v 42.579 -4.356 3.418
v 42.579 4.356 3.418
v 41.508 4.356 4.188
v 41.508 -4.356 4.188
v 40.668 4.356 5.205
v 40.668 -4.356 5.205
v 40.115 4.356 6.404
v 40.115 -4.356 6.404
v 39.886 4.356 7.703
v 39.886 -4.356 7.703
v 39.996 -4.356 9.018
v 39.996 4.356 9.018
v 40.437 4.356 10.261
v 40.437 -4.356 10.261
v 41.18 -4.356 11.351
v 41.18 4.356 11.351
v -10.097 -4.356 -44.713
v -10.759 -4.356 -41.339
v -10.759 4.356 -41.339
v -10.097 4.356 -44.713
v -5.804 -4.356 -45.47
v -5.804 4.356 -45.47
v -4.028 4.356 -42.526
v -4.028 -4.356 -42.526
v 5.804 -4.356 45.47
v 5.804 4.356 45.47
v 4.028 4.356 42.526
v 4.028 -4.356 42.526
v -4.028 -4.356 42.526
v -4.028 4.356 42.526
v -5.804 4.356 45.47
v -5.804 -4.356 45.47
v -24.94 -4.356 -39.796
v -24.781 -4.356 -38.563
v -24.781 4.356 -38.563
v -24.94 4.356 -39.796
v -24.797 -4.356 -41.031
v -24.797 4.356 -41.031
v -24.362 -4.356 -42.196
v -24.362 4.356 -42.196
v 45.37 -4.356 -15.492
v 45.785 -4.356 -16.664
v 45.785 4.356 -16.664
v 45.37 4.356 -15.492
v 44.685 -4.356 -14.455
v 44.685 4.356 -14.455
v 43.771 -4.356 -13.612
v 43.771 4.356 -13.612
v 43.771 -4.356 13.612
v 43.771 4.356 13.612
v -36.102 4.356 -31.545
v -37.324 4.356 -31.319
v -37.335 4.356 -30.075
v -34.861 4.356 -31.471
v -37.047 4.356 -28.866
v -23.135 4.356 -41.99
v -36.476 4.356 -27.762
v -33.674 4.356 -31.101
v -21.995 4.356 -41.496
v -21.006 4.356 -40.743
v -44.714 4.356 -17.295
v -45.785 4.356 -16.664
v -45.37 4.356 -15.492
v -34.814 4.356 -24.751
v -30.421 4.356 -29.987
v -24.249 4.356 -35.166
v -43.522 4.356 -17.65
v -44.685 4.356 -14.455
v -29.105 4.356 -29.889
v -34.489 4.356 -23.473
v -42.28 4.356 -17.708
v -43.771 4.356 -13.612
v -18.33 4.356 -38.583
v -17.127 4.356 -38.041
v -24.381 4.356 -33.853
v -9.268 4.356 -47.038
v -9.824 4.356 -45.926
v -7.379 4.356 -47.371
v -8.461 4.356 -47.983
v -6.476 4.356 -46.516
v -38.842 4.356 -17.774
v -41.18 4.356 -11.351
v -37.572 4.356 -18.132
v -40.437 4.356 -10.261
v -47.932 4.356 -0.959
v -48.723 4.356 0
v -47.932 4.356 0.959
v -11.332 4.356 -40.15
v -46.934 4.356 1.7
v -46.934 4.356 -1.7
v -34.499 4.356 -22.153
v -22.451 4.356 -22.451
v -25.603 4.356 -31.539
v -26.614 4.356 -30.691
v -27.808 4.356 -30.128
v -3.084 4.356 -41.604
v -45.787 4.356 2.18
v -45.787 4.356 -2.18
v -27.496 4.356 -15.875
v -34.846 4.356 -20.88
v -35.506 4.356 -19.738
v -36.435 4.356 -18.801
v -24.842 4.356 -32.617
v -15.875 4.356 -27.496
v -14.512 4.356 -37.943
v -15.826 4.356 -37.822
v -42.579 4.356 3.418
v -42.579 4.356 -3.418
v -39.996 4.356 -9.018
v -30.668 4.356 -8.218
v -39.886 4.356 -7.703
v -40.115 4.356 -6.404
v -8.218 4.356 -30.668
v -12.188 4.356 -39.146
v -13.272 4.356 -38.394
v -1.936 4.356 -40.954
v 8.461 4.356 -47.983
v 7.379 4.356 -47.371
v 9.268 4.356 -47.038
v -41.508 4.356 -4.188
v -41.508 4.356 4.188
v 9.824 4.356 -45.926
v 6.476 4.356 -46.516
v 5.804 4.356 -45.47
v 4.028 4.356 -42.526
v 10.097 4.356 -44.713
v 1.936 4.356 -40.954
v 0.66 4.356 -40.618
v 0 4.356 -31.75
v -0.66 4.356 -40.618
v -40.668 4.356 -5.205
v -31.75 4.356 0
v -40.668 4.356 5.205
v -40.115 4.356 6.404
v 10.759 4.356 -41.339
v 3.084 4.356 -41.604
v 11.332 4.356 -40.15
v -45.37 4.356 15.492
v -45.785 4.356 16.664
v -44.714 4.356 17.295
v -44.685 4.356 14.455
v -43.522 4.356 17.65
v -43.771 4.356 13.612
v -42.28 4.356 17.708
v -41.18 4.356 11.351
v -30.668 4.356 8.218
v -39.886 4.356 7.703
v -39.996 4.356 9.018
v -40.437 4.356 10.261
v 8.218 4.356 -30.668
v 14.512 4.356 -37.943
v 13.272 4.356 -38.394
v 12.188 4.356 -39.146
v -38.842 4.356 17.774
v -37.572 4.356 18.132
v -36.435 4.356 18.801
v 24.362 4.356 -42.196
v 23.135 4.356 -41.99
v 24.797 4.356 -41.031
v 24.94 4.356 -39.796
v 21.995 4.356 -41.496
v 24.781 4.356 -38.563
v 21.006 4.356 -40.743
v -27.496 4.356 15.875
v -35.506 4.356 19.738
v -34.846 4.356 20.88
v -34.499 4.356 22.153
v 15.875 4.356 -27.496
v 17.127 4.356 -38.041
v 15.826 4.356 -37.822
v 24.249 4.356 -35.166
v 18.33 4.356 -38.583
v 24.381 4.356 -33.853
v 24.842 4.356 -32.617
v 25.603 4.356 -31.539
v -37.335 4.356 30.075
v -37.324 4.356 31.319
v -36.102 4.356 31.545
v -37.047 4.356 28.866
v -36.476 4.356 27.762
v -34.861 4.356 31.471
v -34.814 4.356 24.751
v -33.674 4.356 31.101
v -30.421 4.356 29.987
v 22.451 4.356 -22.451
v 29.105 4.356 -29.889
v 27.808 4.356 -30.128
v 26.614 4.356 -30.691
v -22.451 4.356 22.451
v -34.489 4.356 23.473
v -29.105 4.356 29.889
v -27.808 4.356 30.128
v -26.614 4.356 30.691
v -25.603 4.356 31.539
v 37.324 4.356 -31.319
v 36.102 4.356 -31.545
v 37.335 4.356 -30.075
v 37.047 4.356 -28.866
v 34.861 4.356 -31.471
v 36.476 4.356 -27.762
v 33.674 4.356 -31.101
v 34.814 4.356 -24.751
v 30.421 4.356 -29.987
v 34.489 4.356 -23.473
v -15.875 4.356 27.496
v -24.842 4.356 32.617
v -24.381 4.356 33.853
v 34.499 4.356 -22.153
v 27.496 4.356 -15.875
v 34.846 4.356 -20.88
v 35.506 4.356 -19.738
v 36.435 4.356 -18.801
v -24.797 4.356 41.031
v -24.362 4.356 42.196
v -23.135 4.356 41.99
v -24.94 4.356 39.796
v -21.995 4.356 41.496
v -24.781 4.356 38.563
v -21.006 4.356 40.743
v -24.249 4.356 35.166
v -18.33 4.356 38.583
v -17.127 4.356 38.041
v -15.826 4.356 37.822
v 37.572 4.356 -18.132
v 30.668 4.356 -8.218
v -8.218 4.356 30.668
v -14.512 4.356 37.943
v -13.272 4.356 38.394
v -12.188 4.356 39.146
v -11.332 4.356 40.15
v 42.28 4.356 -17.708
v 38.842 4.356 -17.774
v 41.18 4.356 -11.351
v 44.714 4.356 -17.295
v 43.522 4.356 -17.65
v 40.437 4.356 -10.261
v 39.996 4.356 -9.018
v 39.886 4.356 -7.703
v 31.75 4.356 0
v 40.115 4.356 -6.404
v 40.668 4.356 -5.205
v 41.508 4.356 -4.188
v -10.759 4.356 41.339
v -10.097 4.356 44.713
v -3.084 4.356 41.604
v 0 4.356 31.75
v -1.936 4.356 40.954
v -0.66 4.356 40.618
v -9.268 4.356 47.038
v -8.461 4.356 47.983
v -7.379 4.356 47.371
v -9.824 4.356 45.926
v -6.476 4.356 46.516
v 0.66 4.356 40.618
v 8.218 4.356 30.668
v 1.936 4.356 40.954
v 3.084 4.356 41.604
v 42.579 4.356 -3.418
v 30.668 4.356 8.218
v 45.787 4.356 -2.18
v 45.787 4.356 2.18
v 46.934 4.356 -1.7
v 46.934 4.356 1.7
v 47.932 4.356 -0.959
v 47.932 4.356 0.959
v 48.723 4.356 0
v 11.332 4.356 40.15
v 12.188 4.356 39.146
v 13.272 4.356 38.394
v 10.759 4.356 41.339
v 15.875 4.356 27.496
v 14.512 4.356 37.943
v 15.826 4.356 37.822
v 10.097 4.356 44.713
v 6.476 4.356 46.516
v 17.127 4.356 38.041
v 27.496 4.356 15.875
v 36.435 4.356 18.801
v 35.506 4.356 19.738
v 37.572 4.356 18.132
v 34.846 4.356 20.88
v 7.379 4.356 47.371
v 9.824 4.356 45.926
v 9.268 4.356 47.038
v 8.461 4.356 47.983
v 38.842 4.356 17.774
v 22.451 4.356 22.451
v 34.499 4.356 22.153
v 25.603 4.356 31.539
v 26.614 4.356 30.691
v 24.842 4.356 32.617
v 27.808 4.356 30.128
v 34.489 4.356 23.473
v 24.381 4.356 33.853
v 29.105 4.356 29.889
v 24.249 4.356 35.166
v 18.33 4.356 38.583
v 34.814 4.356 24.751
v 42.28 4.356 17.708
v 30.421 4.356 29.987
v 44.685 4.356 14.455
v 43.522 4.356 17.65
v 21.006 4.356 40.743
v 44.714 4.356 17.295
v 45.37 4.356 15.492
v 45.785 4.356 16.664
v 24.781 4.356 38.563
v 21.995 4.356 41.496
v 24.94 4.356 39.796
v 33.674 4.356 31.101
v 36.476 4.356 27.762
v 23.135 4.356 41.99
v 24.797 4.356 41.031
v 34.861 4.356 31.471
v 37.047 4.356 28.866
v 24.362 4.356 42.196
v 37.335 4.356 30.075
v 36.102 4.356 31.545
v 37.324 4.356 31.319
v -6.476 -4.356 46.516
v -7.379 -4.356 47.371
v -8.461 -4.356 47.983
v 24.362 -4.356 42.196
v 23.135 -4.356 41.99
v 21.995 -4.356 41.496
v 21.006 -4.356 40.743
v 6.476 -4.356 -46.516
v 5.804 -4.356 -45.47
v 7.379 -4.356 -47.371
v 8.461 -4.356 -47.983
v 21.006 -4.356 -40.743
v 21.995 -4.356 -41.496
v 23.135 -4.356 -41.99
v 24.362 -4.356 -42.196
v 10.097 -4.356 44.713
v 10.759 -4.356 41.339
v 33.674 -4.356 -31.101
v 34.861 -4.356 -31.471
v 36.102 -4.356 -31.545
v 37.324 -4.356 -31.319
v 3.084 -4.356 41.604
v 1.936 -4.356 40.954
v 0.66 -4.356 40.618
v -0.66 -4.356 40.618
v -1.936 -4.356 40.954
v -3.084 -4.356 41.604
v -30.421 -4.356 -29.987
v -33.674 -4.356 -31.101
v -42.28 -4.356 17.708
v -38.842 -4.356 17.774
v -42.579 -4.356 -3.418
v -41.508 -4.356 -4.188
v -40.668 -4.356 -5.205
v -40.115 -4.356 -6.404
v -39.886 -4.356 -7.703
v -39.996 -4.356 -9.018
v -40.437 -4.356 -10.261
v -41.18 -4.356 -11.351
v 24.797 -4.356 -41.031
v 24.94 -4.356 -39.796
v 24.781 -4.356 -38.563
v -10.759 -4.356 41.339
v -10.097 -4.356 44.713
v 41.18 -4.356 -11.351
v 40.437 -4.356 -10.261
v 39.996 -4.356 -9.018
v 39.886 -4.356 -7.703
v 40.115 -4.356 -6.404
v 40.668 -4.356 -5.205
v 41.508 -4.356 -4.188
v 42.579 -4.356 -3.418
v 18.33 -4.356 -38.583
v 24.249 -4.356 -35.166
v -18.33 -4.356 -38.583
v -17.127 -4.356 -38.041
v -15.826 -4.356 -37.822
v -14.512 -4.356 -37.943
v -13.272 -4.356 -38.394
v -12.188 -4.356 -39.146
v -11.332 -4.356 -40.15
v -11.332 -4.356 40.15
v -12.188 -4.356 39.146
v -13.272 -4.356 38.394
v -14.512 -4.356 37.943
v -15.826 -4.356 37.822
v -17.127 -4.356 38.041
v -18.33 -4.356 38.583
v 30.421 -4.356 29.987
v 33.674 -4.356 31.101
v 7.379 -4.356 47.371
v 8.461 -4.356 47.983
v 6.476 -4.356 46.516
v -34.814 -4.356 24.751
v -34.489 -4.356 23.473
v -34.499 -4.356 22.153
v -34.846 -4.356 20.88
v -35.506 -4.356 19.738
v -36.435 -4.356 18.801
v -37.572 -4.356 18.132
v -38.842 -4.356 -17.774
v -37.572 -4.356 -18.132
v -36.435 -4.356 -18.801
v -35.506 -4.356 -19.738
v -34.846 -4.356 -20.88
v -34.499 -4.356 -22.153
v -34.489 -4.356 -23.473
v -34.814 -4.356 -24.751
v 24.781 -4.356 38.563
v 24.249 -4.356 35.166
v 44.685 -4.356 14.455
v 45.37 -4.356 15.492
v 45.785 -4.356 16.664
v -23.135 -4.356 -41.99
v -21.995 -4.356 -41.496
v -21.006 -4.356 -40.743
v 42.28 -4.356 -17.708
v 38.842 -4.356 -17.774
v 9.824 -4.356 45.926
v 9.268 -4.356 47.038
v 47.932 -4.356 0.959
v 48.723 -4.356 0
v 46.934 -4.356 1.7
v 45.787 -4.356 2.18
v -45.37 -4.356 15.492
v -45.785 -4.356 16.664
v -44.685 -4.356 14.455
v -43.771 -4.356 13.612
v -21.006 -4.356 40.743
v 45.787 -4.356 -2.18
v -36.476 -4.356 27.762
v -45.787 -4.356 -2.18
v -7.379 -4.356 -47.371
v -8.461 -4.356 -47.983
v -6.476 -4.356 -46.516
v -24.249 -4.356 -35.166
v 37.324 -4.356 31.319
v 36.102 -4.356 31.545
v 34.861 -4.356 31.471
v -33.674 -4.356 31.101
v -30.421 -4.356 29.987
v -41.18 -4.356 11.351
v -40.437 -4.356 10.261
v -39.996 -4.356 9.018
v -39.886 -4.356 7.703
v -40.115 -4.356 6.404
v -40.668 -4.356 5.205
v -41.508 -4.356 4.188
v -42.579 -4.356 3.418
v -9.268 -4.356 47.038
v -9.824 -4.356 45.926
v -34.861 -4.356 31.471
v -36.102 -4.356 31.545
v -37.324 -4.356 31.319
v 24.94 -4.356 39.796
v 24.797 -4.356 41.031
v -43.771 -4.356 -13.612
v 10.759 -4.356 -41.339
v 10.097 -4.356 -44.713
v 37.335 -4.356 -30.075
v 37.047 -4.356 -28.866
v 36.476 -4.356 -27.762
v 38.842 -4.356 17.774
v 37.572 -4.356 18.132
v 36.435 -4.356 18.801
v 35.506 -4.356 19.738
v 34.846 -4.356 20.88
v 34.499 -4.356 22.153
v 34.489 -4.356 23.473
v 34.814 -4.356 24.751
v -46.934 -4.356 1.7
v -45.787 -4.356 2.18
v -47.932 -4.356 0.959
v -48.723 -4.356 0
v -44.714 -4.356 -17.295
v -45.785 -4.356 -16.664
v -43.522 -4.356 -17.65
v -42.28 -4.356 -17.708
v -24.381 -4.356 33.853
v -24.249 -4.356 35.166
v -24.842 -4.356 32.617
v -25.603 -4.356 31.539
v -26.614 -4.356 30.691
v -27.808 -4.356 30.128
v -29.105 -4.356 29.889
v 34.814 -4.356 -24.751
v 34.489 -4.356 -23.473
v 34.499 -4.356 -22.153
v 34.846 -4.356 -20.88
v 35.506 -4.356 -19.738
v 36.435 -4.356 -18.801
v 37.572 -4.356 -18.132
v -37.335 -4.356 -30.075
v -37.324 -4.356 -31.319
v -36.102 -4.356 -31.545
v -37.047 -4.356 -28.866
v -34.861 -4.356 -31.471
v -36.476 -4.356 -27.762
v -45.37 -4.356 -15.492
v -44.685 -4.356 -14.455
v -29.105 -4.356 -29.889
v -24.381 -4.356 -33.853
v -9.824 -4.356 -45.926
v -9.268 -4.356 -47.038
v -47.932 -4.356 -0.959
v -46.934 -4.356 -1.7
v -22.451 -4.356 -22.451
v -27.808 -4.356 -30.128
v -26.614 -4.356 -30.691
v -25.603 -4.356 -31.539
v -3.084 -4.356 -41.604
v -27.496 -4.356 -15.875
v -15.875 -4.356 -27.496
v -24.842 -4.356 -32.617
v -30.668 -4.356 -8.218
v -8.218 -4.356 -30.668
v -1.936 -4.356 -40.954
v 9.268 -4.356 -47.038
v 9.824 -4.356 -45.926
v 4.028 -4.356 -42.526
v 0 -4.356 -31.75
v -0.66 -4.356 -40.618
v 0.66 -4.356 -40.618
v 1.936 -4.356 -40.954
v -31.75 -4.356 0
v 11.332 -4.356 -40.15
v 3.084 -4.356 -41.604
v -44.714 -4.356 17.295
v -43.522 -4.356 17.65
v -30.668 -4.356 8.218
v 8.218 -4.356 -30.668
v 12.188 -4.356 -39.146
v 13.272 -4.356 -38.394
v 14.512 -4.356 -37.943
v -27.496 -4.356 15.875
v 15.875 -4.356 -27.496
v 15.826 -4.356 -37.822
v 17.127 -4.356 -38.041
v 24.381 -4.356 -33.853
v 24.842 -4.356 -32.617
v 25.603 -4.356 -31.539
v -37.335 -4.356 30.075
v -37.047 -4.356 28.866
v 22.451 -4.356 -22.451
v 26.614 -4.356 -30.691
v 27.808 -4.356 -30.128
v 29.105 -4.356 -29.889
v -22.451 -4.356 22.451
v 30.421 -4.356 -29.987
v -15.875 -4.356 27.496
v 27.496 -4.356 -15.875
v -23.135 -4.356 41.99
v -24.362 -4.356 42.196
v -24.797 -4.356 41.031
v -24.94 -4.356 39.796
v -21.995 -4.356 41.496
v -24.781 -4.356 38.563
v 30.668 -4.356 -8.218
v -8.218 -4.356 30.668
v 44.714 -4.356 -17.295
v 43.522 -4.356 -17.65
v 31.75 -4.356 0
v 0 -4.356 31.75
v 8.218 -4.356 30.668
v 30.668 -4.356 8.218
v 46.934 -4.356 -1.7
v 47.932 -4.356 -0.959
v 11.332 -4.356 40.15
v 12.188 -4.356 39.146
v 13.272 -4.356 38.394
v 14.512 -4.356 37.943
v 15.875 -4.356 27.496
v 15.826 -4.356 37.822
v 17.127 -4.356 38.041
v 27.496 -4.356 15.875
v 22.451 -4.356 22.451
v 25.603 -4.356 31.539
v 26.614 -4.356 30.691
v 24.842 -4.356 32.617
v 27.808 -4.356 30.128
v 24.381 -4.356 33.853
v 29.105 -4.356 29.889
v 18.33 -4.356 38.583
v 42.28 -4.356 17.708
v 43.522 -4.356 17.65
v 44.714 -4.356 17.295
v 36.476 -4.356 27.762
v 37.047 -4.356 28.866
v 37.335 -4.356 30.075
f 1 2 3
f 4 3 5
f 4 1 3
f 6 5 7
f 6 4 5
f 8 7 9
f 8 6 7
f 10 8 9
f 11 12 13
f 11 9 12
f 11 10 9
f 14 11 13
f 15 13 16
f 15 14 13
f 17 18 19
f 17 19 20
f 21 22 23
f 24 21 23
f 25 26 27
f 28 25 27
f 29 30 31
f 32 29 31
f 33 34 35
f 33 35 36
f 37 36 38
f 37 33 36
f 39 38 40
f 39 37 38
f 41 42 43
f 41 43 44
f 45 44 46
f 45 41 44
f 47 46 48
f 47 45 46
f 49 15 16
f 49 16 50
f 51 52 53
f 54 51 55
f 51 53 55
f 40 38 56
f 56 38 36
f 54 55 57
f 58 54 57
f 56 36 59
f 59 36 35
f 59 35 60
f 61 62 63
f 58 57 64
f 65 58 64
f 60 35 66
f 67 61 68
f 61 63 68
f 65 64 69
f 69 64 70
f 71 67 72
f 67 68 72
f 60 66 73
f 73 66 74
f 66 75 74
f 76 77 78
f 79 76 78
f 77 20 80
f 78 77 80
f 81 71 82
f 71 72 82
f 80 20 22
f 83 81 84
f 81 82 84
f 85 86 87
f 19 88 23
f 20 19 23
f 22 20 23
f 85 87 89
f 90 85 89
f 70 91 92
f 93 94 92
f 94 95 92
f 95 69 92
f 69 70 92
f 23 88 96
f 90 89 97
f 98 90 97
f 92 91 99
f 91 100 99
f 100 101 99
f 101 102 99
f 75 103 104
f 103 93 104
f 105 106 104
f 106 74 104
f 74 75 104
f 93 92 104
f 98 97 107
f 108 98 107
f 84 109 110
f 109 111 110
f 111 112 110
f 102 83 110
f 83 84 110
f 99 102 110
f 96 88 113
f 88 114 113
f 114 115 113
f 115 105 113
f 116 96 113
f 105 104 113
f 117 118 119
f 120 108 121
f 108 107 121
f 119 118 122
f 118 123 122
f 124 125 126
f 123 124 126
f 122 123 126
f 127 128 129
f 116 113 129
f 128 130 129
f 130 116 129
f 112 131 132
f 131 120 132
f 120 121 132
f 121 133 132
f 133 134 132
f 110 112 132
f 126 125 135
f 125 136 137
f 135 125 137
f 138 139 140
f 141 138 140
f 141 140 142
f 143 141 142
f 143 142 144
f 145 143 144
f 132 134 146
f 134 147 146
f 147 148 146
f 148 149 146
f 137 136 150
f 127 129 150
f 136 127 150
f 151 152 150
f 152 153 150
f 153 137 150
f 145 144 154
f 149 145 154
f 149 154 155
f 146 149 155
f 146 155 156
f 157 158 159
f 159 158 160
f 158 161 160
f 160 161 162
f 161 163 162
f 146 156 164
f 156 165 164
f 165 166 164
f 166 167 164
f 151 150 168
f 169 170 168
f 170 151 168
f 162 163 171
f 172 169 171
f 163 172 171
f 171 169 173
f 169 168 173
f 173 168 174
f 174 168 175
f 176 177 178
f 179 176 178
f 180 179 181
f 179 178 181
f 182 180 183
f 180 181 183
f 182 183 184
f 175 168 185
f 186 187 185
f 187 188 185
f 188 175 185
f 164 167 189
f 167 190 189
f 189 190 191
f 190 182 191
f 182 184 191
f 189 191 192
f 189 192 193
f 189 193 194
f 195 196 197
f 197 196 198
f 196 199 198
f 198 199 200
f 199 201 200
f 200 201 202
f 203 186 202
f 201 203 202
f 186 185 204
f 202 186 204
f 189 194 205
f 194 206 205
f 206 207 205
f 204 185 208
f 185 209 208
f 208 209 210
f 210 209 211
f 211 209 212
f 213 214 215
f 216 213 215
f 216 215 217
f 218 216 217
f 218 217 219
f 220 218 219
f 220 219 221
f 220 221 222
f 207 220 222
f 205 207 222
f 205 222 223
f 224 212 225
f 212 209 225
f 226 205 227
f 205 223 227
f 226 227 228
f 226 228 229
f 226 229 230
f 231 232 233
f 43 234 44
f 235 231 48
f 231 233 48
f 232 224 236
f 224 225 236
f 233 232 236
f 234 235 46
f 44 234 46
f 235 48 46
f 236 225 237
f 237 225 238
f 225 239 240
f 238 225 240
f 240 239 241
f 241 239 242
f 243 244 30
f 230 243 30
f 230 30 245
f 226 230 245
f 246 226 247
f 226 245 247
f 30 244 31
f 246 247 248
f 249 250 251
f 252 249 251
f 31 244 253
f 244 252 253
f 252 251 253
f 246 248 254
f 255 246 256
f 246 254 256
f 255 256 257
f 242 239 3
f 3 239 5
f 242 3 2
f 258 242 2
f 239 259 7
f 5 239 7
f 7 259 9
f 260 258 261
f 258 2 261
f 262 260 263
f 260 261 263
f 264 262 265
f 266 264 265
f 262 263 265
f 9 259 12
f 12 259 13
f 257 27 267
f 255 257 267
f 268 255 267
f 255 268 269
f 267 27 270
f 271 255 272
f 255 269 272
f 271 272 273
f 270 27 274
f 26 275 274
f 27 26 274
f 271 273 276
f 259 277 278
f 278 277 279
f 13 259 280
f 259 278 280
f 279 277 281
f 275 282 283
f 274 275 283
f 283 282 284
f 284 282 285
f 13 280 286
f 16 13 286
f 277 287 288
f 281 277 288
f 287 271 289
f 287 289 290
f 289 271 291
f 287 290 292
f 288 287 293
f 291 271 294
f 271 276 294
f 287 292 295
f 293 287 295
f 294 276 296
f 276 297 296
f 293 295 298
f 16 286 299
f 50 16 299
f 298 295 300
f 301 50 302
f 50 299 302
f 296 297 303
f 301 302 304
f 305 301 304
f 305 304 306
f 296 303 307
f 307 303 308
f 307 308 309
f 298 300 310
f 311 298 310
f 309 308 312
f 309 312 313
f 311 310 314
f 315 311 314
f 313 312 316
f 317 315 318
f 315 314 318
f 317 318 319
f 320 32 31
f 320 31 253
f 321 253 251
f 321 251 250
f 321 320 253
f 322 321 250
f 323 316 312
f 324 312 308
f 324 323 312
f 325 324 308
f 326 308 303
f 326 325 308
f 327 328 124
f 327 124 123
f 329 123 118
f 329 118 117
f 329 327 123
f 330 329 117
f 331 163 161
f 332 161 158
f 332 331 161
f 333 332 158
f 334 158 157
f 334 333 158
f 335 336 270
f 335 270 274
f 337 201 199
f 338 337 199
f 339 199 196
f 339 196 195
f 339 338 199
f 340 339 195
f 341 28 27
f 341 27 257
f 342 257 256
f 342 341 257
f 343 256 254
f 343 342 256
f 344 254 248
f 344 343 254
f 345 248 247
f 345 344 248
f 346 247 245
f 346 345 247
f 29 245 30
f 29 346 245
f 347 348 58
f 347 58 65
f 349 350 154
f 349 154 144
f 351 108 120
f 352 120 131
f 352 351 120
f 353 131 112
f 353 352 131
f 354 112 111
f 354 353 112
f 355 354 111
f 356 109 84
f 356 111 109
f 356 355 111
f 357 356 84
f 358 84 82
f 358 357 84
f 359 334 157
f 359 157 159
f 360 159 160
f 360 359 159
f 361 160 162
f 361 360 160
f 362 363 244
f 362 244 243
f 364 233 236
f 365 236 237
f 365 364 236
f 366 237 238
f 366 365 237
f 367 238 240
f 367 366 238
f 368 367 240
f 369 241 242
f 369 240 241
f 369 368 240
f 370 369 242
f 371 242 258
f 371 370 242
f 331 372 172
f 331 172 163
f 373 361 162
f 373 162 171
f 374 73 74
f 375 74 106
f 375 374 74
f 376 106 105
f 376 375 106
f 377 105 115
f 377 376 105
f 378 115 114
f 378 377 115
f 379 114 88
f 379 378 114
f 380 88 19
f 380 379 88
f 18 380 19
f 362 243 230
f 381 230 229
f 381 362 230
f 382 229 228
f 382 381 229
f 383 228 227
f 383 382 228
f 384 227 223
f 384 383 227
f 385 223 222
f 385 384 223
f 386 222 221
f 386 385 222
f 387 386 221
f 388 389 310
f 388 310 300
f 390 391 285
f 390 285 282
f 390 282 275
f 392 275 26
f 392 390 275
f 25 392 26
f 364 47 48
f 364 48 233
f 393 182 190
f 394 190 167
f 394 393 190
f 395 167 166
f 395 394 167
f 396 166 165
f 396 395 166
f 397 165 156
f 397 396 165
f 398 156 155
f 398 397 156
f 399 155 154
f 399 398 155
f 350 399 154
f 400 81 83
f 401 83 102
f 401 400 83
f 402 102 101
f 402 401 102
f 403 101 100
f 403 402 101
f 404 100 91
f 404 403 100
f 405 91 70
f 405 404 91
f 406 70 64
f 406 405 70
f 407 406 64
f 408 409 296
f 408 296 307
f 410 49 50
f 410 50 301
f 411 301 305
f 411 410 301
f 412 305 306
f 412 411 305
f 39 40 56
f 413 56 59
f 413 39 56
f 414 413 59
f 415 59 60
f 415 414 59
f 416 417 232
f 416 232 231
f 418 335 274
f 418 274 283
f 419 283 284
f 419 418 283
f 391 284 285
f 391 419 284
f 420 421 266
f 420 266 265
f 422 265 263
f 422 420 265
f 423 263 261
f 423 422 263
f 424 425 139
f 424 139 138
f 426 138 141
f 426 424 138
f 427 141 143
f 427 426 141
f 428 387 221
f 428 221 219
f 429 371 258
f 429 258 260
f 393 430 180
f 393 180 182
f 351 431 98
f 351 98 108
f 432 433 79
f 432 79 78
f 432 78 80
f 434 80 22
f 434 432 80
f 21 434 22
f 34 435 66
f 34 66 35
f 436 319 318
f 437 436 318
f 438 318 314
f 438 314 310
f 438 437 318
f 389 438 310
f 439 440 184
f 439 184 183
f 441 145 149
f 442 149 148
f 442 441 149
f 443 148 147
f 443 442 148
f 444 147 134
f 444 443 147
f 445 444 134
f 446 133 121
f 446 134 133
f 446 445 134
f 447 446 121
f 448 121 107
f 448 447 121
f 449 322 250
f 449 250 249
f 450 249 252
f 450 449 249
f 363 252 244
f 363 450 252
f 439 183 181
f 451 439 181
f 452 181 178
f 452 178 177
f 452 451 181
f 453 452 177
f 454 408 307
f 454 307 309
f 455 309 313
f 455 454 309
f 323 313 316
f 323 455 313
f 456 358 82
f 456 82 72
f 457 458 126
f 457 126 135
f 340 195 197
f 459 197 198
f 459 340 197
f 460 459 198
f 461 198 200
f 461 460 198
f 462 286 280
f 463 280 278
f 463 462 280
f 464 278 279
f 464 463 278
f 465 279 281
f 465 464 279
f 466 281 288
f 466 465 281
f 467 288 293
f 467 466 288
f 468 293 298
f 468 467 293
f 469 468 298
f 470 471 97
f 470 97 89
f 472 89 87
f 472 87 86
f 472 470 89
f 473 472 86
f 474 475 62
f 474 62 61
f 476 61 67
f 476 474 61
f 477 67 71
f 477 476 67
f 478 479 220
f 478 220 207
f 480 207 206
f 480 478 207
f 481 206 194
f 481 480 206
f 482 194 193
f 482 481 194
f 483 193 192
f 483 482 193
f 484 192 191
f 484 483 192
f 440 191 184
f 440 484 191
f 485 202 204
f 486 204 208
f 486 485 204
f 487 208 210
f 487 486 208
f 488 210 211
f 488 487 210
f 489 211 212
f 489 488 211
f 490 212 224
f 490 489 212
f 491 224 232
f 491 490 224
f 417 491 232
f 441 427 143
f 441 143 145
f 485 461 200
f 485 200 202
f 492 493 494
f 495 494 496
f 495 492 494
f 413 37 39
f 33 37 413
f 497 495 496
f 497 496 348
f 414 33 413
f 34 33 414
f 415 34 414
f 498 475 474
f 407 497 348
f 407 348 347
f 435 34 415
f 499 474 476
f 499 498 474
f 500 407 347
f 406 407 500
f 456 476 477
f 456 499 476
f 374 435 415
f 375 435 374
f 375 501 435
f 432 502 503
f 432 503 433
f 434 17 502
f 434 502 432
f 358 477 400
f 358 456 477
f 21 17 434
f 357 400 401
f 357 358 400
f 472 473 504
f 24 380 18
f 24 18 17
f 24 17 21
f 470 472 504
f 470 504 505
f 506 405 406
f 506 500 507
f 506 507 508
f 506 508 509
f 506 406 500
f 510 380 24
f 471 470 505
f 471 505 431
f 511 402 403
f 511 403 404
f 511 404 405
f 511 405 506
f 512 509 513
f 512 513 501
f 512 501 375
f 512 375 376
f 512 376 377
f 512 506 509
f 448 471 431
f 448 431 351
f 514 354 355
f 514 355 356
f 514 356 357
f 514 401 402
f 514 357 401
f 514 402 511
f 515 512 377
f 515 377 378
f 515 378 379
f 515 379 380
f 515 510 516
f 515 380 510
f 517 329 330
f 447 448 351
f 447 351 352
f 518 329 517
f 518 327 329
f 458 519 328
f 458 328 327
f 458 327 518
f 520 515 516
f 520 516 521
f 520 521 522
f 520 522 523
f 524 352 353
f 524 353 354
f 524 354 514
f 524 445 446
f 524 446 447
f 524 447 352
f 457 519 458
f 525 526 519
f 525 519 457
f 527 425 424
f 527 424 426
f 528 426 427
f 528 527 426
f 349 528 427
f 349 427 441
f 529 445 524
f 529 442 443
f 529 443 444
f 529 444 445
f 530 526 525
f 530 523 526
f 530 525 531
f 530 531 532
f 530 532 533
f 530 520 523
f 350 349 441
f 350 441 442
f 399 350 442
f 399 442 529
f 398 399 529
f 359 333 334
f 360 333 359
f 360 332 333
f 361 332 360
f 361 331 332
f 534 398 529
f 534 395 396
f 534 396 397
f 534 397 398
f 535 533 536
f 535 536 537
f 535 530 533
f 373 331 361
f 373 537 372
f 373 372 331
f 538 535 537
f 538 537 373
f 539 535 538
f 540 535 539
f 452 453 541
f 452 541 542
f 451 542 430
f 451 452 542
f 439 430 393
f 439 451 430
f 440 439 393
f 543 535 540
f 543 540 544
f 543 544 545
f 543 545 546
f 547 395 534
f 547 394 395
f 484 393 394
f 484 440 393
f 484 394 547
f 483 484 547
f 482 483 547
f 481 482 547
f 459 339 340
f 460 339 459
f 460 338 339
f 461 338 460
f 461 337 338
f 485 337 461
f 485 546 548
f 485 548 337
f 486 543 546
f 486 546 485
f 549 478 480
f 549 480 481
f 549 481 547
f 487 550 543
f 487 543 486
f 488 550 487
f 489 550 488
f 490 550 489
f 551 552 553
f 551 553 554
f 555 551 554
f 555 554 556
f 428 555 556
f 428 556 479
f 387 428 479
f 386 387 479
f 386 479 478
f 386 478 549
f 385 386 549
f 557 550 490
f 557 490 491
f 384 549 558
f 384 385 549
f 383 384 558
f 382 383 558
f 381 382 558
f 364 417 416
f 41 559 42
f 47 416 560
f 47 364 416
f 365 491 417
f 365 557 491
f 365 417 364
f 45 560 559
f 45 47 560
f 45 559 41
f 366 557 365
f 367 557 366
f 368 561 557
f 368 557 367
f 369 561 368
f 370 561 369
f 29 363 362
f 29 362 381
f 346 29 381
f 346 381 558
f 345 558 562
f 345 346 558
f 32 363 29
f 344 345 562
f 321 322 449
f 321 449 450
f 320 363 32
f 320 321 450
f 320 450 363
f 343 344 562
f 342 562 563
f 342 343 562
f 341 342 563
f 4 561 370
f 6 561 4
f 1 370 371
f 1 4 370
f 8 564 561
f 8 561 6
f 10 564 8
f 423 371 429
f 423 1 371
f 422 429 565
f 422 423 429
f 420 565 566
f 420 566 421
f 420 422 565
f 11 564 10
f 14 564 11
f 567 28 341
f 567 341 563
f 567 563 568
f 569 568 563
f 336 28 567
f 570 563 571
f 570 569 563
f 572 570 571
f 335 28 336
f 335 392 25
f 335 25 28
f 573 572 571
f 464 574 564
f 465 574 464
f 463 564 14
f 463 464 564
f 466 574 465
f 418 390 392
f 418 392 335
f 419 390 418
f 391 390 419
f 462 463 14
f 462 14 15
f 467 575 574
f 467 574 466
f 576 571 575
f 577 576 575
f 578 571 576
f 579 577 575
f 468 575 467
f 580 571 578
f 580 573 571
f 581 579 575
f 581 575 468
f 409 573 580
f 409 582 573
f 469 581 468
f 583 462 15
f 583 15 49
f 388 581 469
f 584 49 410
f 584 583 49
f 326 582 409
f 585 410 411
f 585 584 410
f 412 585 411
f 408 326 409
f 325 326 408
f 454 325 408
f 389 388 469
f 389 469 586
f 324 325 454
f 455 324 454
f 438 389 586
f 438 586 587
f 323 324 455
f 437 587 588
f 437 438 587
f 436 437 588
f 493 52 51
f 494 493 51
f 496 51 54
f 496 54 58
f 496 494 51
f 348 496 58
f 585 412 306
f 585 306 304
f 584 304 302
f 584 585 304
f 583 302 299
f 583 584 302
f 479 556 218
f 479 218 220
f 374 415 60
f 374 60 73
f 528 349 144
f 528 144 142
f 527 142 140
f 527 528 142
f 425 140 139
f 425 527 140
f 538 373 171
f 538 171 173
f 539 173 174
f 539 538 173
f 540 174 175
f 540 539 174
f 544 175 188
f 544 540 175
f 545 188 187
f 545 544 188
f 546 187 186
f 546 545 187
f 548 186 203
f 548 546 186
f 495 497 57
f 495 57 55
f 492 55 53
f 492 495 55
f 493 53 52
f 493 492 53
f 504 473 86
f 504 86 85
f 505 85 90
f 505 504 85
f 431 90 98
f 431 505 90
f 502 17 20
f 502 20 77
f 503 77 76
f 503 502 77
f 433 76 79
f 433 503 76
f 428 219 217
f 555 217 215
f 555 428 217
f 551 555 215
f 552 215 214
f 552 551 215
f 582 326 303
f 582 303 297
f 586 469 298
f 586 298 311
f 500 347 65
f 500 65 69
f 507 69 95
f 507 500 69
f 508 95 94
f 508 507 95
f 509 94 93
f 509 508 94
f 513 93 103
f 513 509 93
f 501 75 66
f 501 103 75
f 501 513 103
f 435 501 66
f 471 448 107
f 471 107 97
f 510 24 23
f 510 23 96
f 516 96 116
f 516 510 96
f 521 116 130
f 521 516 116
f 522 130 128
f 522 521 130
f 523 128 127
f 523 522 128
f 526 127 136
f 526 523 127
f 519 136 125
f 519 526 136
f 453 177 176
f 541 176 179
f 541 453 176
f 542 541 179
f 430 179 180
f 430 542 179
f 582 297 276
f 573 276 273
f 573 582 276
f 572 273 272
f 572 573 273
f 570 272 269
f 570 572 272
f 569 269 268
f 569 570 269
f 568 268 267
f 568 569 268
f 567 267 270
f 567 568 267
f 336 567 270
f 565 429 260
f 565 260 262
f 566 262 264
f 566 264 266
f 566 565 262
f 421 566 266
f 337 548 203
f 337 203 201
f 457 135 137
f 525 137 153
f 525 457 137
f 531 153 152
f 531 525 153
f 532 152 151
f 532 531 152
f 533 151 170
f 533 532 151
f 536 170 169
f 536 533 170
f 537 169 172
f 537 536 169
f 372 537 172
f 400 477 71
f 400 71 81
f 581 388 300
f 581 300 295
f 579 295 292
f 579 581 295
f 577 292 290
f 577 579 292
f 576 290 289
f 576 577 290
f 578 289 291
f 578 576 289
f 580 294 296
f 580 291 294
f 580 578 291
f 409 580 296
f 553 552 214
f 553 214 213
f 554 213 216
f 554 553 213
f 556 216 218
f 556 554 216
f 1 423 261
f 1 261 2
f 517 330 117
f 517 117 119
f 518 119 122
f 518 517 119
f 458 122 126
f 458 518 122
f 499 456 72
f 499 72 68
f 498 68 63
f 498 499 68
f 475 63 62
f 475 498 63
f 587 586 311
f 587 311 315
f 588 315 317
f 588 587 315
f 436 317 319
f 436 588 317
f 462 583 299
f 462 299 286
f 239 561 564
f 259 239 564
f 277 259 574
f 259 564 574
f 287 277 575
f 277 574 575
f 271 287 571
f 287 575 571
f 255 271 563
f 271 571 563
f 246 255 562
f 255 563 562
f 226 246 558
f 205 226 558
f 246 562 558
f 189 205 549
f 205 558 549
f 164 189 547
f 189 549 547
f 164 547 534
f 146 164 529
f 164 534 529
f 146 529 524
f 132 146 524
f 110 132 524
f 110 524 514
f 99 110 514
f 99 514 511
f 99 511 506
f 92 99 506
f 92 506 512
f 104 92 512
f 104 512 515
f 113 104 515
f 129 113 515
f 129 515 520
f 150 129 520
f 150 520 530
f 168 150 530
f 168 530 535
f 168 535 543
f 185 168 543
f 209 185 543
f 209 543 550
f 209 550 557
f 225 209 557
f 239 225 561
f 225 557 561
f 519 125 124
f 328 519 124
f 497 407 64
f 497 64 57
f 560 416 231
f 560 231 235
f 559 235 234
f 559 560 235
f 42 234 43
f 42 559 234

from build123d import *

# Parameters (mm, degrees)
F0_R     = 49.784
F1_DEPTH = 4.3561
F2_R     = 31.75
F3_DEPTH = 8.7132
F4_R     = 31.75
F5_DEPTH = 8.7132


with BuildPart() as f1:
    # F0 (on Front) → F1 (new body, symmetric)
    with BuildSketch(Plane.XZ):
        Circle(F0_R)
    extrude(amount=F1_DEPTH, both=True)

    # F2 (on face) → F3 (cut, through all)
    with BuildSketch(Plane.XZ.offset(4.3561)):
        Circle(F2_R)
    extrude(amount=-F3_DEPTH, mode=Mode.SUBTRACT)

    # F4 (on face) → F5 (intersect, through all)
    with BuildSketch(Plane.XZ.offset(4.3561)):
        with BuildLine():
            Line((-4.0281049428, 42.525724672), (-5.8042455242, 45.4699524537))
            ThreePointArc((-5.8042455242, 45.4699524537), (-6.9011720072, 46.9709680265), (-8.4606952501, 47.9829871535))
            ThreePointArc((-8.4606952501, 47.9829871535), (-9.5800368067, 46.4986118846), (-10.0974329669, 44.7129476743))
            Line((-10.0974329669, 44.7129476743), (-10.7594739569, 41.3388026977))
            ThreePointArc((-10.7594739569, 41.3388026977), (-13.8775459801, 38.1282442177), (-18.3298349378, 38.583416638))
            Line((-18.3298349378, 38.583416638), (-21.0058463435, 40.7426099021))
            ThreePointArc((-21.0058463435, 40.7426099021), (-22.5499976265, 41.7779322066), (-24.3616010367, 42.1955307493))
            ThreePointArc((-24.3616010367, 42.1955307493), (-24.9057517953, 40.4178369031), (-24.78121202, 38.5629015125))
            Line((-24.78121202, 38.5629015125), (-24.2493015044, 35.1658110223))
            ThreePointArc((-24.2493015044, 35.1658110223), (-26.0812551042, 31.0824294698), (-30.4207163198, 29.9873791269))
            Line((-30.4207163198, 29.9873791269), (-33.6738320805, 31.1011072995))
            ThreePointArc((-33.6738320805, 31.1011072995), (-35.4789607295, 31.5458611861), (-37.3241381993, 31.318670597))
            ThreePointArc((-37.3241381993, 31.318670597), (-37.2274655477, 29.4620742873), (-36.4760111717, 27.7616003006))
            Line((-36.4760111717, 27.7616003006), (-34.8143054089, 24.7513035456))
            ThreePointArc((-34.8143054089, 24.7513035456), (-35.1391799444, 20.287615), (-38.8424103517, 17.7744211264))
            Line((-38.8424103517, 17.7744211264), (-42.2802566958, 17.7083521531))
            ThreePointArc((-42.2802566958, 17.7083521531), (-44.1286375548, 17.5088937391), (-45.7848334494, 16.6643165564))
            ThreePointArc((-45.7848334494, 16.6643165564), (-45.0589975361, 14.9527506986), (-43.7712650475, 13.6118403748))
            Line((-43.7712650475, 13.6118403748), (-41.1801902767, 11.3514235709))
            ThreePointArc((-41.1801902767, 11.3514235709), (-39.9588010843, 7.0458147479), (-42.5791364422, 3.4176056157))
            Line((-42.5791364422, 3.4176056157), (-45.7870583635, 2.1797083896))
            ThreePointArc((-45.7870583635, 2.1797083896), (-47.4557494218, 1.3600953035), (-48.7232020734, 0))
            ThreePointArc((-48.7232020734, 0), (-47.4557494218, -1.3600953035), (-45.7870583635, -2.1797083896))
            Line((-45.7870583635, -2.1797083896), (-42.5791364422, -3.4176056157))
            ThreePointArc((-42.5791364422, -3.4176056157), (-39.9588010843, -7.0458147479), (-41.1801902767, -11.3514235709))
            Line((-41.1801902767, -11.3514235709), (-43.7712650475, -13.6118403748))
            ThreePointArc((-43.7712650475, -13.6118403748), (-45.0589975361, -14.9527506986), (-45.7848334494, -16.6643165564))
            ThreePointArc((-45.7848334494, -16.6643165564), (-44.1286375548, -17.5088937391), (-42.2802566958, -17.7083521531))
            Line((-42.2802566958, -17.7083521531), (-38.8424103517, -17.7744211264))
            ThreePointArc((-38.8424103517, -17.7744211264), (-35.1391799444, -20.287615), (-34.8143054089, -24.7513035456))
            Line((-34.8143054089, -24.7513035456), (-36.4760111717, -27.7616003006))
            ThreePointArc((-36.4760111717, -27.7616003006), (-37.2274655477, -29.4620742873), (-37.3241381993, -31.318670597))
            ThreePointArc((-37.3241381993, -31.318670597), (-35.4789607295, -31.5458611861), (-33.6738320805, -31.1011072995))
            Line((-33.6738320805, -31.1011072995), (-30.4207163198, -29.9873791269))
            ThreePointArc((-30.4207163198, -29.9873791269), (-26.0812551042, -31.0824294698), (-24.2493015044, -35.1658110223))
            Line((-24.2493015044, -35.1658110223), (-24.78121202, -38.5629015125))
            ThreePointArc((-24.78121202, -38.5629015125), (-24.9057517953, -40.4178369031), (-24.3616010367, -42.1955307493))
            ThreePointArc((-24.3616010367, -42.1955307493), (-22.5499976265, -41.7779322066), (-21.0058463435, -40.7426099021))
            Line((-21.0058463435, -40.7426099021), (-18.3298349378, -38.583416638))
            ThreePointArc((-18.3298349378, -38.583416638), (-13.8775459801, -38.1282442177), (-10.7594739569, -41.3388026977))
            Line((-10.7594739569, -41.3388026977), (-10.0974329669, -44.7129476743))
            ThreePointArc((-10.0974329669, -44.7129476743), (-9.5800368067, -46.4986118846), (-8.4606952501, -47.9829871535))
            ThreePointArc((-8.4606952501, -47.9829871535), (-6.9011720072, -46.9709680265), (-5.8042455242, -45.4699524537))
            Line((-5.8042455242, -45.4699524537), (-4.0281049428, -42.525724672))
            ThreePointArc((-4.0281049428, -42.525724672), (0, -40.57523), (4.0281049428, -42.525724672))
            Line((4.0281049428, -42.525724672), (5.8042455242, -45.4699524537))
            ThreePointArc((5.8042455242, -45.4699524537), (6.9011720072, -46.9709680265), (8.4606952501, -47.9829871535))
            ThreePointArc((8.4606952501, -47.9829871535), (9.5800368067, -46.4986118846), (10.0974329669, -44.7129476743))
            Line((10.0974329669, -44.7129476743), (10.7594739569, -41.3388026977))
            ThreePointArc((10.7594739569, -41.3388026977), (13.8775459801, -38.1282442177), (18.3298349378, -38.583416638))
            Line((18.3298349378, -38.583416638), (21.0058463435, -40.7426099021))
            ThreePointArc((21.0058463435, -40.7426099021), (22.5499976265, -41.7779322066), (24.3616010367, -42.1955307493))
            ThreePointArc((24.3616010367, -42.1955307493), (24.9057517953, -40.4178369031), (24.78121202, -38.5629015125))
            Line((24.78121202, -38.5629015125), (24.2493015044, -35.1658110223))
            ThreePointArc((24.2493015044, -35.1658110223), (26.0812551042, -31.0824294698), (30.4207163198, -29.9873791269))
            Line((30.4207163198, -29.9873791269), (33.6738320805, -31.1011072995))
            ThreePointArc((33.6738320805, -31.1011072995), (35.4789607295, -31.5458611861), (37.3241381993, -31.318670597))
            ThreePointArc((37.3241381993, -31.318670597), (37.2274655477, -29.4620742873), (36.4760111717, -27.7616003006))
            Line((36.4760111717, -27.7616003006), (34.8143054089, -24.7513035456))
            ThreePointArc((34.8143054089, -24.7513035456), (35.1391799444, -20.287615), (38.8424103517, -17.7744211264))
            Line((38.8424103517, -17.7744211264), (42.2802566958, -17.7083521531))
            ThreePointArc((42.2802566958, -17.7083521531), (44.1286375548, -17.5088937391), (45.7848334494, -16.6643165564))
            ThreePointArc((45.7848334494, -16.6643165564), (45.0589975361, -14.9527506986), (43.7712650475, -13.6118403748))
            Line((43.7712650475, -13.6118403748), (41.1801902767, -11.3514235709))
            ThreePointArc((41.1801902767, -11.3514235709), (39.9588010843, -7.0458147479), (42.5791364422, -3.4176056157))
            Line((42.5791364422, -3.4176056157), (45.7870583635, -2.1797083896))
            ThreePointArc((45.7870583635, -2.1797083896), (47.4557494218, -1.3600953035), (48.7232020734, 0))
            ThreePointArc((48.7232020734, 0), (47.4557494218, 1.3600953035), (45.7870583635, 2.1797083896))
            Line((45.7870583635, 2.1797083896), (42.5791364422, 3.4176056157))
            ThreePointArc((42.5791364422, 3.4176056157), (39.9588010843, 7.0458147479), (41.1801902767, 11.3514235709))
            Line((41.1801902767, 11.3514235709), (43.7712650475, 13.6118403748))
            ThreePointArc((43.7712650475, 13.6118403748), (45.0589975361, 14.9527506986), (45.7848334494, 16.6643165564))
            ThreePointArc((45.7848334494, 16.6643165564), (44.1286375548, 17.5088937391), (42.2802566958, 17.7083521531))
            Line((42.2802566958, 17.7083521531), (38.8424103517, 17.7744211264))
            ThreePointArc((38.8424103517, 17.7744211264), (35.1391799444, 20.287615), (34.8143054089, 24.7513035456))
            Line((34.8143054089, 24.7513035456), (36.4760111717, 27.7616003006))
            ThreePointArc((36.4760111717, 27.7616003006), (37.2274655477, 29.4620742873), (37.3241381993, 31.318670597))
            ThreePointArc((37.3241381993, 31.318670597), (35.4789607295, 31.5458611861), (33.6738320805, 31.1011072995))
            Line((33.6738320805, 31.1011072995), (30.4207163198, 29.9873791269))
            ThreePointArc((30.4207163198, 29.9873791269), (26.0812551042, 31.0824294698), (24.2493015044, 35.1658110223))
            Line((24.2493015044, 35.1658110223), (24.78121202, 38.5629015125))
            ThreePointArc((24.78121202, 38.5629015125), (24.9057517953, 40.4178369031), (24.3616010367, 42.1955307493))
            ThreePointArc((24.3616010367, 42.1955307493), (22.5499976265, 41.7779322066), (21.0058463435, 40.7426099021))
            Line((21.0058463435, 40.7426099021), (18.3298349378, 38.583416638))
            ThreePointArc((18.3298349378, 38.583416638), (13.8775459801, 38.1282442177), (10.7594739569, 41.3388026977))
            Line((10.7594739569, 41.3388026977), (10.0974329669, 44.7129476743))
            ThreePointArc((10.0974329669, 44.7129476743), (9.5800368067, 46.4986118846), (8.4606952501, 47.9829871535))
            ThreePointArc((8.4606952501, 47.9829871535), (6.9011720072, 46.9709680265), (5.8042455242, 45.4699524537))
            Line((5.8042455242, 45.4699524537), (4.0281049428, 42.525724672))
            ThreePointArc((4.0281049428, 42.525724672), (0, 40.57523), (-4.0281049428, 42.525724672))
        make_face()
        Circle(F4_R, mode=Mode.SUBTRACT)
    extrude(amount=-F5_DEPTH, mode=Mode.INTERSECT)


solid = f1.part
